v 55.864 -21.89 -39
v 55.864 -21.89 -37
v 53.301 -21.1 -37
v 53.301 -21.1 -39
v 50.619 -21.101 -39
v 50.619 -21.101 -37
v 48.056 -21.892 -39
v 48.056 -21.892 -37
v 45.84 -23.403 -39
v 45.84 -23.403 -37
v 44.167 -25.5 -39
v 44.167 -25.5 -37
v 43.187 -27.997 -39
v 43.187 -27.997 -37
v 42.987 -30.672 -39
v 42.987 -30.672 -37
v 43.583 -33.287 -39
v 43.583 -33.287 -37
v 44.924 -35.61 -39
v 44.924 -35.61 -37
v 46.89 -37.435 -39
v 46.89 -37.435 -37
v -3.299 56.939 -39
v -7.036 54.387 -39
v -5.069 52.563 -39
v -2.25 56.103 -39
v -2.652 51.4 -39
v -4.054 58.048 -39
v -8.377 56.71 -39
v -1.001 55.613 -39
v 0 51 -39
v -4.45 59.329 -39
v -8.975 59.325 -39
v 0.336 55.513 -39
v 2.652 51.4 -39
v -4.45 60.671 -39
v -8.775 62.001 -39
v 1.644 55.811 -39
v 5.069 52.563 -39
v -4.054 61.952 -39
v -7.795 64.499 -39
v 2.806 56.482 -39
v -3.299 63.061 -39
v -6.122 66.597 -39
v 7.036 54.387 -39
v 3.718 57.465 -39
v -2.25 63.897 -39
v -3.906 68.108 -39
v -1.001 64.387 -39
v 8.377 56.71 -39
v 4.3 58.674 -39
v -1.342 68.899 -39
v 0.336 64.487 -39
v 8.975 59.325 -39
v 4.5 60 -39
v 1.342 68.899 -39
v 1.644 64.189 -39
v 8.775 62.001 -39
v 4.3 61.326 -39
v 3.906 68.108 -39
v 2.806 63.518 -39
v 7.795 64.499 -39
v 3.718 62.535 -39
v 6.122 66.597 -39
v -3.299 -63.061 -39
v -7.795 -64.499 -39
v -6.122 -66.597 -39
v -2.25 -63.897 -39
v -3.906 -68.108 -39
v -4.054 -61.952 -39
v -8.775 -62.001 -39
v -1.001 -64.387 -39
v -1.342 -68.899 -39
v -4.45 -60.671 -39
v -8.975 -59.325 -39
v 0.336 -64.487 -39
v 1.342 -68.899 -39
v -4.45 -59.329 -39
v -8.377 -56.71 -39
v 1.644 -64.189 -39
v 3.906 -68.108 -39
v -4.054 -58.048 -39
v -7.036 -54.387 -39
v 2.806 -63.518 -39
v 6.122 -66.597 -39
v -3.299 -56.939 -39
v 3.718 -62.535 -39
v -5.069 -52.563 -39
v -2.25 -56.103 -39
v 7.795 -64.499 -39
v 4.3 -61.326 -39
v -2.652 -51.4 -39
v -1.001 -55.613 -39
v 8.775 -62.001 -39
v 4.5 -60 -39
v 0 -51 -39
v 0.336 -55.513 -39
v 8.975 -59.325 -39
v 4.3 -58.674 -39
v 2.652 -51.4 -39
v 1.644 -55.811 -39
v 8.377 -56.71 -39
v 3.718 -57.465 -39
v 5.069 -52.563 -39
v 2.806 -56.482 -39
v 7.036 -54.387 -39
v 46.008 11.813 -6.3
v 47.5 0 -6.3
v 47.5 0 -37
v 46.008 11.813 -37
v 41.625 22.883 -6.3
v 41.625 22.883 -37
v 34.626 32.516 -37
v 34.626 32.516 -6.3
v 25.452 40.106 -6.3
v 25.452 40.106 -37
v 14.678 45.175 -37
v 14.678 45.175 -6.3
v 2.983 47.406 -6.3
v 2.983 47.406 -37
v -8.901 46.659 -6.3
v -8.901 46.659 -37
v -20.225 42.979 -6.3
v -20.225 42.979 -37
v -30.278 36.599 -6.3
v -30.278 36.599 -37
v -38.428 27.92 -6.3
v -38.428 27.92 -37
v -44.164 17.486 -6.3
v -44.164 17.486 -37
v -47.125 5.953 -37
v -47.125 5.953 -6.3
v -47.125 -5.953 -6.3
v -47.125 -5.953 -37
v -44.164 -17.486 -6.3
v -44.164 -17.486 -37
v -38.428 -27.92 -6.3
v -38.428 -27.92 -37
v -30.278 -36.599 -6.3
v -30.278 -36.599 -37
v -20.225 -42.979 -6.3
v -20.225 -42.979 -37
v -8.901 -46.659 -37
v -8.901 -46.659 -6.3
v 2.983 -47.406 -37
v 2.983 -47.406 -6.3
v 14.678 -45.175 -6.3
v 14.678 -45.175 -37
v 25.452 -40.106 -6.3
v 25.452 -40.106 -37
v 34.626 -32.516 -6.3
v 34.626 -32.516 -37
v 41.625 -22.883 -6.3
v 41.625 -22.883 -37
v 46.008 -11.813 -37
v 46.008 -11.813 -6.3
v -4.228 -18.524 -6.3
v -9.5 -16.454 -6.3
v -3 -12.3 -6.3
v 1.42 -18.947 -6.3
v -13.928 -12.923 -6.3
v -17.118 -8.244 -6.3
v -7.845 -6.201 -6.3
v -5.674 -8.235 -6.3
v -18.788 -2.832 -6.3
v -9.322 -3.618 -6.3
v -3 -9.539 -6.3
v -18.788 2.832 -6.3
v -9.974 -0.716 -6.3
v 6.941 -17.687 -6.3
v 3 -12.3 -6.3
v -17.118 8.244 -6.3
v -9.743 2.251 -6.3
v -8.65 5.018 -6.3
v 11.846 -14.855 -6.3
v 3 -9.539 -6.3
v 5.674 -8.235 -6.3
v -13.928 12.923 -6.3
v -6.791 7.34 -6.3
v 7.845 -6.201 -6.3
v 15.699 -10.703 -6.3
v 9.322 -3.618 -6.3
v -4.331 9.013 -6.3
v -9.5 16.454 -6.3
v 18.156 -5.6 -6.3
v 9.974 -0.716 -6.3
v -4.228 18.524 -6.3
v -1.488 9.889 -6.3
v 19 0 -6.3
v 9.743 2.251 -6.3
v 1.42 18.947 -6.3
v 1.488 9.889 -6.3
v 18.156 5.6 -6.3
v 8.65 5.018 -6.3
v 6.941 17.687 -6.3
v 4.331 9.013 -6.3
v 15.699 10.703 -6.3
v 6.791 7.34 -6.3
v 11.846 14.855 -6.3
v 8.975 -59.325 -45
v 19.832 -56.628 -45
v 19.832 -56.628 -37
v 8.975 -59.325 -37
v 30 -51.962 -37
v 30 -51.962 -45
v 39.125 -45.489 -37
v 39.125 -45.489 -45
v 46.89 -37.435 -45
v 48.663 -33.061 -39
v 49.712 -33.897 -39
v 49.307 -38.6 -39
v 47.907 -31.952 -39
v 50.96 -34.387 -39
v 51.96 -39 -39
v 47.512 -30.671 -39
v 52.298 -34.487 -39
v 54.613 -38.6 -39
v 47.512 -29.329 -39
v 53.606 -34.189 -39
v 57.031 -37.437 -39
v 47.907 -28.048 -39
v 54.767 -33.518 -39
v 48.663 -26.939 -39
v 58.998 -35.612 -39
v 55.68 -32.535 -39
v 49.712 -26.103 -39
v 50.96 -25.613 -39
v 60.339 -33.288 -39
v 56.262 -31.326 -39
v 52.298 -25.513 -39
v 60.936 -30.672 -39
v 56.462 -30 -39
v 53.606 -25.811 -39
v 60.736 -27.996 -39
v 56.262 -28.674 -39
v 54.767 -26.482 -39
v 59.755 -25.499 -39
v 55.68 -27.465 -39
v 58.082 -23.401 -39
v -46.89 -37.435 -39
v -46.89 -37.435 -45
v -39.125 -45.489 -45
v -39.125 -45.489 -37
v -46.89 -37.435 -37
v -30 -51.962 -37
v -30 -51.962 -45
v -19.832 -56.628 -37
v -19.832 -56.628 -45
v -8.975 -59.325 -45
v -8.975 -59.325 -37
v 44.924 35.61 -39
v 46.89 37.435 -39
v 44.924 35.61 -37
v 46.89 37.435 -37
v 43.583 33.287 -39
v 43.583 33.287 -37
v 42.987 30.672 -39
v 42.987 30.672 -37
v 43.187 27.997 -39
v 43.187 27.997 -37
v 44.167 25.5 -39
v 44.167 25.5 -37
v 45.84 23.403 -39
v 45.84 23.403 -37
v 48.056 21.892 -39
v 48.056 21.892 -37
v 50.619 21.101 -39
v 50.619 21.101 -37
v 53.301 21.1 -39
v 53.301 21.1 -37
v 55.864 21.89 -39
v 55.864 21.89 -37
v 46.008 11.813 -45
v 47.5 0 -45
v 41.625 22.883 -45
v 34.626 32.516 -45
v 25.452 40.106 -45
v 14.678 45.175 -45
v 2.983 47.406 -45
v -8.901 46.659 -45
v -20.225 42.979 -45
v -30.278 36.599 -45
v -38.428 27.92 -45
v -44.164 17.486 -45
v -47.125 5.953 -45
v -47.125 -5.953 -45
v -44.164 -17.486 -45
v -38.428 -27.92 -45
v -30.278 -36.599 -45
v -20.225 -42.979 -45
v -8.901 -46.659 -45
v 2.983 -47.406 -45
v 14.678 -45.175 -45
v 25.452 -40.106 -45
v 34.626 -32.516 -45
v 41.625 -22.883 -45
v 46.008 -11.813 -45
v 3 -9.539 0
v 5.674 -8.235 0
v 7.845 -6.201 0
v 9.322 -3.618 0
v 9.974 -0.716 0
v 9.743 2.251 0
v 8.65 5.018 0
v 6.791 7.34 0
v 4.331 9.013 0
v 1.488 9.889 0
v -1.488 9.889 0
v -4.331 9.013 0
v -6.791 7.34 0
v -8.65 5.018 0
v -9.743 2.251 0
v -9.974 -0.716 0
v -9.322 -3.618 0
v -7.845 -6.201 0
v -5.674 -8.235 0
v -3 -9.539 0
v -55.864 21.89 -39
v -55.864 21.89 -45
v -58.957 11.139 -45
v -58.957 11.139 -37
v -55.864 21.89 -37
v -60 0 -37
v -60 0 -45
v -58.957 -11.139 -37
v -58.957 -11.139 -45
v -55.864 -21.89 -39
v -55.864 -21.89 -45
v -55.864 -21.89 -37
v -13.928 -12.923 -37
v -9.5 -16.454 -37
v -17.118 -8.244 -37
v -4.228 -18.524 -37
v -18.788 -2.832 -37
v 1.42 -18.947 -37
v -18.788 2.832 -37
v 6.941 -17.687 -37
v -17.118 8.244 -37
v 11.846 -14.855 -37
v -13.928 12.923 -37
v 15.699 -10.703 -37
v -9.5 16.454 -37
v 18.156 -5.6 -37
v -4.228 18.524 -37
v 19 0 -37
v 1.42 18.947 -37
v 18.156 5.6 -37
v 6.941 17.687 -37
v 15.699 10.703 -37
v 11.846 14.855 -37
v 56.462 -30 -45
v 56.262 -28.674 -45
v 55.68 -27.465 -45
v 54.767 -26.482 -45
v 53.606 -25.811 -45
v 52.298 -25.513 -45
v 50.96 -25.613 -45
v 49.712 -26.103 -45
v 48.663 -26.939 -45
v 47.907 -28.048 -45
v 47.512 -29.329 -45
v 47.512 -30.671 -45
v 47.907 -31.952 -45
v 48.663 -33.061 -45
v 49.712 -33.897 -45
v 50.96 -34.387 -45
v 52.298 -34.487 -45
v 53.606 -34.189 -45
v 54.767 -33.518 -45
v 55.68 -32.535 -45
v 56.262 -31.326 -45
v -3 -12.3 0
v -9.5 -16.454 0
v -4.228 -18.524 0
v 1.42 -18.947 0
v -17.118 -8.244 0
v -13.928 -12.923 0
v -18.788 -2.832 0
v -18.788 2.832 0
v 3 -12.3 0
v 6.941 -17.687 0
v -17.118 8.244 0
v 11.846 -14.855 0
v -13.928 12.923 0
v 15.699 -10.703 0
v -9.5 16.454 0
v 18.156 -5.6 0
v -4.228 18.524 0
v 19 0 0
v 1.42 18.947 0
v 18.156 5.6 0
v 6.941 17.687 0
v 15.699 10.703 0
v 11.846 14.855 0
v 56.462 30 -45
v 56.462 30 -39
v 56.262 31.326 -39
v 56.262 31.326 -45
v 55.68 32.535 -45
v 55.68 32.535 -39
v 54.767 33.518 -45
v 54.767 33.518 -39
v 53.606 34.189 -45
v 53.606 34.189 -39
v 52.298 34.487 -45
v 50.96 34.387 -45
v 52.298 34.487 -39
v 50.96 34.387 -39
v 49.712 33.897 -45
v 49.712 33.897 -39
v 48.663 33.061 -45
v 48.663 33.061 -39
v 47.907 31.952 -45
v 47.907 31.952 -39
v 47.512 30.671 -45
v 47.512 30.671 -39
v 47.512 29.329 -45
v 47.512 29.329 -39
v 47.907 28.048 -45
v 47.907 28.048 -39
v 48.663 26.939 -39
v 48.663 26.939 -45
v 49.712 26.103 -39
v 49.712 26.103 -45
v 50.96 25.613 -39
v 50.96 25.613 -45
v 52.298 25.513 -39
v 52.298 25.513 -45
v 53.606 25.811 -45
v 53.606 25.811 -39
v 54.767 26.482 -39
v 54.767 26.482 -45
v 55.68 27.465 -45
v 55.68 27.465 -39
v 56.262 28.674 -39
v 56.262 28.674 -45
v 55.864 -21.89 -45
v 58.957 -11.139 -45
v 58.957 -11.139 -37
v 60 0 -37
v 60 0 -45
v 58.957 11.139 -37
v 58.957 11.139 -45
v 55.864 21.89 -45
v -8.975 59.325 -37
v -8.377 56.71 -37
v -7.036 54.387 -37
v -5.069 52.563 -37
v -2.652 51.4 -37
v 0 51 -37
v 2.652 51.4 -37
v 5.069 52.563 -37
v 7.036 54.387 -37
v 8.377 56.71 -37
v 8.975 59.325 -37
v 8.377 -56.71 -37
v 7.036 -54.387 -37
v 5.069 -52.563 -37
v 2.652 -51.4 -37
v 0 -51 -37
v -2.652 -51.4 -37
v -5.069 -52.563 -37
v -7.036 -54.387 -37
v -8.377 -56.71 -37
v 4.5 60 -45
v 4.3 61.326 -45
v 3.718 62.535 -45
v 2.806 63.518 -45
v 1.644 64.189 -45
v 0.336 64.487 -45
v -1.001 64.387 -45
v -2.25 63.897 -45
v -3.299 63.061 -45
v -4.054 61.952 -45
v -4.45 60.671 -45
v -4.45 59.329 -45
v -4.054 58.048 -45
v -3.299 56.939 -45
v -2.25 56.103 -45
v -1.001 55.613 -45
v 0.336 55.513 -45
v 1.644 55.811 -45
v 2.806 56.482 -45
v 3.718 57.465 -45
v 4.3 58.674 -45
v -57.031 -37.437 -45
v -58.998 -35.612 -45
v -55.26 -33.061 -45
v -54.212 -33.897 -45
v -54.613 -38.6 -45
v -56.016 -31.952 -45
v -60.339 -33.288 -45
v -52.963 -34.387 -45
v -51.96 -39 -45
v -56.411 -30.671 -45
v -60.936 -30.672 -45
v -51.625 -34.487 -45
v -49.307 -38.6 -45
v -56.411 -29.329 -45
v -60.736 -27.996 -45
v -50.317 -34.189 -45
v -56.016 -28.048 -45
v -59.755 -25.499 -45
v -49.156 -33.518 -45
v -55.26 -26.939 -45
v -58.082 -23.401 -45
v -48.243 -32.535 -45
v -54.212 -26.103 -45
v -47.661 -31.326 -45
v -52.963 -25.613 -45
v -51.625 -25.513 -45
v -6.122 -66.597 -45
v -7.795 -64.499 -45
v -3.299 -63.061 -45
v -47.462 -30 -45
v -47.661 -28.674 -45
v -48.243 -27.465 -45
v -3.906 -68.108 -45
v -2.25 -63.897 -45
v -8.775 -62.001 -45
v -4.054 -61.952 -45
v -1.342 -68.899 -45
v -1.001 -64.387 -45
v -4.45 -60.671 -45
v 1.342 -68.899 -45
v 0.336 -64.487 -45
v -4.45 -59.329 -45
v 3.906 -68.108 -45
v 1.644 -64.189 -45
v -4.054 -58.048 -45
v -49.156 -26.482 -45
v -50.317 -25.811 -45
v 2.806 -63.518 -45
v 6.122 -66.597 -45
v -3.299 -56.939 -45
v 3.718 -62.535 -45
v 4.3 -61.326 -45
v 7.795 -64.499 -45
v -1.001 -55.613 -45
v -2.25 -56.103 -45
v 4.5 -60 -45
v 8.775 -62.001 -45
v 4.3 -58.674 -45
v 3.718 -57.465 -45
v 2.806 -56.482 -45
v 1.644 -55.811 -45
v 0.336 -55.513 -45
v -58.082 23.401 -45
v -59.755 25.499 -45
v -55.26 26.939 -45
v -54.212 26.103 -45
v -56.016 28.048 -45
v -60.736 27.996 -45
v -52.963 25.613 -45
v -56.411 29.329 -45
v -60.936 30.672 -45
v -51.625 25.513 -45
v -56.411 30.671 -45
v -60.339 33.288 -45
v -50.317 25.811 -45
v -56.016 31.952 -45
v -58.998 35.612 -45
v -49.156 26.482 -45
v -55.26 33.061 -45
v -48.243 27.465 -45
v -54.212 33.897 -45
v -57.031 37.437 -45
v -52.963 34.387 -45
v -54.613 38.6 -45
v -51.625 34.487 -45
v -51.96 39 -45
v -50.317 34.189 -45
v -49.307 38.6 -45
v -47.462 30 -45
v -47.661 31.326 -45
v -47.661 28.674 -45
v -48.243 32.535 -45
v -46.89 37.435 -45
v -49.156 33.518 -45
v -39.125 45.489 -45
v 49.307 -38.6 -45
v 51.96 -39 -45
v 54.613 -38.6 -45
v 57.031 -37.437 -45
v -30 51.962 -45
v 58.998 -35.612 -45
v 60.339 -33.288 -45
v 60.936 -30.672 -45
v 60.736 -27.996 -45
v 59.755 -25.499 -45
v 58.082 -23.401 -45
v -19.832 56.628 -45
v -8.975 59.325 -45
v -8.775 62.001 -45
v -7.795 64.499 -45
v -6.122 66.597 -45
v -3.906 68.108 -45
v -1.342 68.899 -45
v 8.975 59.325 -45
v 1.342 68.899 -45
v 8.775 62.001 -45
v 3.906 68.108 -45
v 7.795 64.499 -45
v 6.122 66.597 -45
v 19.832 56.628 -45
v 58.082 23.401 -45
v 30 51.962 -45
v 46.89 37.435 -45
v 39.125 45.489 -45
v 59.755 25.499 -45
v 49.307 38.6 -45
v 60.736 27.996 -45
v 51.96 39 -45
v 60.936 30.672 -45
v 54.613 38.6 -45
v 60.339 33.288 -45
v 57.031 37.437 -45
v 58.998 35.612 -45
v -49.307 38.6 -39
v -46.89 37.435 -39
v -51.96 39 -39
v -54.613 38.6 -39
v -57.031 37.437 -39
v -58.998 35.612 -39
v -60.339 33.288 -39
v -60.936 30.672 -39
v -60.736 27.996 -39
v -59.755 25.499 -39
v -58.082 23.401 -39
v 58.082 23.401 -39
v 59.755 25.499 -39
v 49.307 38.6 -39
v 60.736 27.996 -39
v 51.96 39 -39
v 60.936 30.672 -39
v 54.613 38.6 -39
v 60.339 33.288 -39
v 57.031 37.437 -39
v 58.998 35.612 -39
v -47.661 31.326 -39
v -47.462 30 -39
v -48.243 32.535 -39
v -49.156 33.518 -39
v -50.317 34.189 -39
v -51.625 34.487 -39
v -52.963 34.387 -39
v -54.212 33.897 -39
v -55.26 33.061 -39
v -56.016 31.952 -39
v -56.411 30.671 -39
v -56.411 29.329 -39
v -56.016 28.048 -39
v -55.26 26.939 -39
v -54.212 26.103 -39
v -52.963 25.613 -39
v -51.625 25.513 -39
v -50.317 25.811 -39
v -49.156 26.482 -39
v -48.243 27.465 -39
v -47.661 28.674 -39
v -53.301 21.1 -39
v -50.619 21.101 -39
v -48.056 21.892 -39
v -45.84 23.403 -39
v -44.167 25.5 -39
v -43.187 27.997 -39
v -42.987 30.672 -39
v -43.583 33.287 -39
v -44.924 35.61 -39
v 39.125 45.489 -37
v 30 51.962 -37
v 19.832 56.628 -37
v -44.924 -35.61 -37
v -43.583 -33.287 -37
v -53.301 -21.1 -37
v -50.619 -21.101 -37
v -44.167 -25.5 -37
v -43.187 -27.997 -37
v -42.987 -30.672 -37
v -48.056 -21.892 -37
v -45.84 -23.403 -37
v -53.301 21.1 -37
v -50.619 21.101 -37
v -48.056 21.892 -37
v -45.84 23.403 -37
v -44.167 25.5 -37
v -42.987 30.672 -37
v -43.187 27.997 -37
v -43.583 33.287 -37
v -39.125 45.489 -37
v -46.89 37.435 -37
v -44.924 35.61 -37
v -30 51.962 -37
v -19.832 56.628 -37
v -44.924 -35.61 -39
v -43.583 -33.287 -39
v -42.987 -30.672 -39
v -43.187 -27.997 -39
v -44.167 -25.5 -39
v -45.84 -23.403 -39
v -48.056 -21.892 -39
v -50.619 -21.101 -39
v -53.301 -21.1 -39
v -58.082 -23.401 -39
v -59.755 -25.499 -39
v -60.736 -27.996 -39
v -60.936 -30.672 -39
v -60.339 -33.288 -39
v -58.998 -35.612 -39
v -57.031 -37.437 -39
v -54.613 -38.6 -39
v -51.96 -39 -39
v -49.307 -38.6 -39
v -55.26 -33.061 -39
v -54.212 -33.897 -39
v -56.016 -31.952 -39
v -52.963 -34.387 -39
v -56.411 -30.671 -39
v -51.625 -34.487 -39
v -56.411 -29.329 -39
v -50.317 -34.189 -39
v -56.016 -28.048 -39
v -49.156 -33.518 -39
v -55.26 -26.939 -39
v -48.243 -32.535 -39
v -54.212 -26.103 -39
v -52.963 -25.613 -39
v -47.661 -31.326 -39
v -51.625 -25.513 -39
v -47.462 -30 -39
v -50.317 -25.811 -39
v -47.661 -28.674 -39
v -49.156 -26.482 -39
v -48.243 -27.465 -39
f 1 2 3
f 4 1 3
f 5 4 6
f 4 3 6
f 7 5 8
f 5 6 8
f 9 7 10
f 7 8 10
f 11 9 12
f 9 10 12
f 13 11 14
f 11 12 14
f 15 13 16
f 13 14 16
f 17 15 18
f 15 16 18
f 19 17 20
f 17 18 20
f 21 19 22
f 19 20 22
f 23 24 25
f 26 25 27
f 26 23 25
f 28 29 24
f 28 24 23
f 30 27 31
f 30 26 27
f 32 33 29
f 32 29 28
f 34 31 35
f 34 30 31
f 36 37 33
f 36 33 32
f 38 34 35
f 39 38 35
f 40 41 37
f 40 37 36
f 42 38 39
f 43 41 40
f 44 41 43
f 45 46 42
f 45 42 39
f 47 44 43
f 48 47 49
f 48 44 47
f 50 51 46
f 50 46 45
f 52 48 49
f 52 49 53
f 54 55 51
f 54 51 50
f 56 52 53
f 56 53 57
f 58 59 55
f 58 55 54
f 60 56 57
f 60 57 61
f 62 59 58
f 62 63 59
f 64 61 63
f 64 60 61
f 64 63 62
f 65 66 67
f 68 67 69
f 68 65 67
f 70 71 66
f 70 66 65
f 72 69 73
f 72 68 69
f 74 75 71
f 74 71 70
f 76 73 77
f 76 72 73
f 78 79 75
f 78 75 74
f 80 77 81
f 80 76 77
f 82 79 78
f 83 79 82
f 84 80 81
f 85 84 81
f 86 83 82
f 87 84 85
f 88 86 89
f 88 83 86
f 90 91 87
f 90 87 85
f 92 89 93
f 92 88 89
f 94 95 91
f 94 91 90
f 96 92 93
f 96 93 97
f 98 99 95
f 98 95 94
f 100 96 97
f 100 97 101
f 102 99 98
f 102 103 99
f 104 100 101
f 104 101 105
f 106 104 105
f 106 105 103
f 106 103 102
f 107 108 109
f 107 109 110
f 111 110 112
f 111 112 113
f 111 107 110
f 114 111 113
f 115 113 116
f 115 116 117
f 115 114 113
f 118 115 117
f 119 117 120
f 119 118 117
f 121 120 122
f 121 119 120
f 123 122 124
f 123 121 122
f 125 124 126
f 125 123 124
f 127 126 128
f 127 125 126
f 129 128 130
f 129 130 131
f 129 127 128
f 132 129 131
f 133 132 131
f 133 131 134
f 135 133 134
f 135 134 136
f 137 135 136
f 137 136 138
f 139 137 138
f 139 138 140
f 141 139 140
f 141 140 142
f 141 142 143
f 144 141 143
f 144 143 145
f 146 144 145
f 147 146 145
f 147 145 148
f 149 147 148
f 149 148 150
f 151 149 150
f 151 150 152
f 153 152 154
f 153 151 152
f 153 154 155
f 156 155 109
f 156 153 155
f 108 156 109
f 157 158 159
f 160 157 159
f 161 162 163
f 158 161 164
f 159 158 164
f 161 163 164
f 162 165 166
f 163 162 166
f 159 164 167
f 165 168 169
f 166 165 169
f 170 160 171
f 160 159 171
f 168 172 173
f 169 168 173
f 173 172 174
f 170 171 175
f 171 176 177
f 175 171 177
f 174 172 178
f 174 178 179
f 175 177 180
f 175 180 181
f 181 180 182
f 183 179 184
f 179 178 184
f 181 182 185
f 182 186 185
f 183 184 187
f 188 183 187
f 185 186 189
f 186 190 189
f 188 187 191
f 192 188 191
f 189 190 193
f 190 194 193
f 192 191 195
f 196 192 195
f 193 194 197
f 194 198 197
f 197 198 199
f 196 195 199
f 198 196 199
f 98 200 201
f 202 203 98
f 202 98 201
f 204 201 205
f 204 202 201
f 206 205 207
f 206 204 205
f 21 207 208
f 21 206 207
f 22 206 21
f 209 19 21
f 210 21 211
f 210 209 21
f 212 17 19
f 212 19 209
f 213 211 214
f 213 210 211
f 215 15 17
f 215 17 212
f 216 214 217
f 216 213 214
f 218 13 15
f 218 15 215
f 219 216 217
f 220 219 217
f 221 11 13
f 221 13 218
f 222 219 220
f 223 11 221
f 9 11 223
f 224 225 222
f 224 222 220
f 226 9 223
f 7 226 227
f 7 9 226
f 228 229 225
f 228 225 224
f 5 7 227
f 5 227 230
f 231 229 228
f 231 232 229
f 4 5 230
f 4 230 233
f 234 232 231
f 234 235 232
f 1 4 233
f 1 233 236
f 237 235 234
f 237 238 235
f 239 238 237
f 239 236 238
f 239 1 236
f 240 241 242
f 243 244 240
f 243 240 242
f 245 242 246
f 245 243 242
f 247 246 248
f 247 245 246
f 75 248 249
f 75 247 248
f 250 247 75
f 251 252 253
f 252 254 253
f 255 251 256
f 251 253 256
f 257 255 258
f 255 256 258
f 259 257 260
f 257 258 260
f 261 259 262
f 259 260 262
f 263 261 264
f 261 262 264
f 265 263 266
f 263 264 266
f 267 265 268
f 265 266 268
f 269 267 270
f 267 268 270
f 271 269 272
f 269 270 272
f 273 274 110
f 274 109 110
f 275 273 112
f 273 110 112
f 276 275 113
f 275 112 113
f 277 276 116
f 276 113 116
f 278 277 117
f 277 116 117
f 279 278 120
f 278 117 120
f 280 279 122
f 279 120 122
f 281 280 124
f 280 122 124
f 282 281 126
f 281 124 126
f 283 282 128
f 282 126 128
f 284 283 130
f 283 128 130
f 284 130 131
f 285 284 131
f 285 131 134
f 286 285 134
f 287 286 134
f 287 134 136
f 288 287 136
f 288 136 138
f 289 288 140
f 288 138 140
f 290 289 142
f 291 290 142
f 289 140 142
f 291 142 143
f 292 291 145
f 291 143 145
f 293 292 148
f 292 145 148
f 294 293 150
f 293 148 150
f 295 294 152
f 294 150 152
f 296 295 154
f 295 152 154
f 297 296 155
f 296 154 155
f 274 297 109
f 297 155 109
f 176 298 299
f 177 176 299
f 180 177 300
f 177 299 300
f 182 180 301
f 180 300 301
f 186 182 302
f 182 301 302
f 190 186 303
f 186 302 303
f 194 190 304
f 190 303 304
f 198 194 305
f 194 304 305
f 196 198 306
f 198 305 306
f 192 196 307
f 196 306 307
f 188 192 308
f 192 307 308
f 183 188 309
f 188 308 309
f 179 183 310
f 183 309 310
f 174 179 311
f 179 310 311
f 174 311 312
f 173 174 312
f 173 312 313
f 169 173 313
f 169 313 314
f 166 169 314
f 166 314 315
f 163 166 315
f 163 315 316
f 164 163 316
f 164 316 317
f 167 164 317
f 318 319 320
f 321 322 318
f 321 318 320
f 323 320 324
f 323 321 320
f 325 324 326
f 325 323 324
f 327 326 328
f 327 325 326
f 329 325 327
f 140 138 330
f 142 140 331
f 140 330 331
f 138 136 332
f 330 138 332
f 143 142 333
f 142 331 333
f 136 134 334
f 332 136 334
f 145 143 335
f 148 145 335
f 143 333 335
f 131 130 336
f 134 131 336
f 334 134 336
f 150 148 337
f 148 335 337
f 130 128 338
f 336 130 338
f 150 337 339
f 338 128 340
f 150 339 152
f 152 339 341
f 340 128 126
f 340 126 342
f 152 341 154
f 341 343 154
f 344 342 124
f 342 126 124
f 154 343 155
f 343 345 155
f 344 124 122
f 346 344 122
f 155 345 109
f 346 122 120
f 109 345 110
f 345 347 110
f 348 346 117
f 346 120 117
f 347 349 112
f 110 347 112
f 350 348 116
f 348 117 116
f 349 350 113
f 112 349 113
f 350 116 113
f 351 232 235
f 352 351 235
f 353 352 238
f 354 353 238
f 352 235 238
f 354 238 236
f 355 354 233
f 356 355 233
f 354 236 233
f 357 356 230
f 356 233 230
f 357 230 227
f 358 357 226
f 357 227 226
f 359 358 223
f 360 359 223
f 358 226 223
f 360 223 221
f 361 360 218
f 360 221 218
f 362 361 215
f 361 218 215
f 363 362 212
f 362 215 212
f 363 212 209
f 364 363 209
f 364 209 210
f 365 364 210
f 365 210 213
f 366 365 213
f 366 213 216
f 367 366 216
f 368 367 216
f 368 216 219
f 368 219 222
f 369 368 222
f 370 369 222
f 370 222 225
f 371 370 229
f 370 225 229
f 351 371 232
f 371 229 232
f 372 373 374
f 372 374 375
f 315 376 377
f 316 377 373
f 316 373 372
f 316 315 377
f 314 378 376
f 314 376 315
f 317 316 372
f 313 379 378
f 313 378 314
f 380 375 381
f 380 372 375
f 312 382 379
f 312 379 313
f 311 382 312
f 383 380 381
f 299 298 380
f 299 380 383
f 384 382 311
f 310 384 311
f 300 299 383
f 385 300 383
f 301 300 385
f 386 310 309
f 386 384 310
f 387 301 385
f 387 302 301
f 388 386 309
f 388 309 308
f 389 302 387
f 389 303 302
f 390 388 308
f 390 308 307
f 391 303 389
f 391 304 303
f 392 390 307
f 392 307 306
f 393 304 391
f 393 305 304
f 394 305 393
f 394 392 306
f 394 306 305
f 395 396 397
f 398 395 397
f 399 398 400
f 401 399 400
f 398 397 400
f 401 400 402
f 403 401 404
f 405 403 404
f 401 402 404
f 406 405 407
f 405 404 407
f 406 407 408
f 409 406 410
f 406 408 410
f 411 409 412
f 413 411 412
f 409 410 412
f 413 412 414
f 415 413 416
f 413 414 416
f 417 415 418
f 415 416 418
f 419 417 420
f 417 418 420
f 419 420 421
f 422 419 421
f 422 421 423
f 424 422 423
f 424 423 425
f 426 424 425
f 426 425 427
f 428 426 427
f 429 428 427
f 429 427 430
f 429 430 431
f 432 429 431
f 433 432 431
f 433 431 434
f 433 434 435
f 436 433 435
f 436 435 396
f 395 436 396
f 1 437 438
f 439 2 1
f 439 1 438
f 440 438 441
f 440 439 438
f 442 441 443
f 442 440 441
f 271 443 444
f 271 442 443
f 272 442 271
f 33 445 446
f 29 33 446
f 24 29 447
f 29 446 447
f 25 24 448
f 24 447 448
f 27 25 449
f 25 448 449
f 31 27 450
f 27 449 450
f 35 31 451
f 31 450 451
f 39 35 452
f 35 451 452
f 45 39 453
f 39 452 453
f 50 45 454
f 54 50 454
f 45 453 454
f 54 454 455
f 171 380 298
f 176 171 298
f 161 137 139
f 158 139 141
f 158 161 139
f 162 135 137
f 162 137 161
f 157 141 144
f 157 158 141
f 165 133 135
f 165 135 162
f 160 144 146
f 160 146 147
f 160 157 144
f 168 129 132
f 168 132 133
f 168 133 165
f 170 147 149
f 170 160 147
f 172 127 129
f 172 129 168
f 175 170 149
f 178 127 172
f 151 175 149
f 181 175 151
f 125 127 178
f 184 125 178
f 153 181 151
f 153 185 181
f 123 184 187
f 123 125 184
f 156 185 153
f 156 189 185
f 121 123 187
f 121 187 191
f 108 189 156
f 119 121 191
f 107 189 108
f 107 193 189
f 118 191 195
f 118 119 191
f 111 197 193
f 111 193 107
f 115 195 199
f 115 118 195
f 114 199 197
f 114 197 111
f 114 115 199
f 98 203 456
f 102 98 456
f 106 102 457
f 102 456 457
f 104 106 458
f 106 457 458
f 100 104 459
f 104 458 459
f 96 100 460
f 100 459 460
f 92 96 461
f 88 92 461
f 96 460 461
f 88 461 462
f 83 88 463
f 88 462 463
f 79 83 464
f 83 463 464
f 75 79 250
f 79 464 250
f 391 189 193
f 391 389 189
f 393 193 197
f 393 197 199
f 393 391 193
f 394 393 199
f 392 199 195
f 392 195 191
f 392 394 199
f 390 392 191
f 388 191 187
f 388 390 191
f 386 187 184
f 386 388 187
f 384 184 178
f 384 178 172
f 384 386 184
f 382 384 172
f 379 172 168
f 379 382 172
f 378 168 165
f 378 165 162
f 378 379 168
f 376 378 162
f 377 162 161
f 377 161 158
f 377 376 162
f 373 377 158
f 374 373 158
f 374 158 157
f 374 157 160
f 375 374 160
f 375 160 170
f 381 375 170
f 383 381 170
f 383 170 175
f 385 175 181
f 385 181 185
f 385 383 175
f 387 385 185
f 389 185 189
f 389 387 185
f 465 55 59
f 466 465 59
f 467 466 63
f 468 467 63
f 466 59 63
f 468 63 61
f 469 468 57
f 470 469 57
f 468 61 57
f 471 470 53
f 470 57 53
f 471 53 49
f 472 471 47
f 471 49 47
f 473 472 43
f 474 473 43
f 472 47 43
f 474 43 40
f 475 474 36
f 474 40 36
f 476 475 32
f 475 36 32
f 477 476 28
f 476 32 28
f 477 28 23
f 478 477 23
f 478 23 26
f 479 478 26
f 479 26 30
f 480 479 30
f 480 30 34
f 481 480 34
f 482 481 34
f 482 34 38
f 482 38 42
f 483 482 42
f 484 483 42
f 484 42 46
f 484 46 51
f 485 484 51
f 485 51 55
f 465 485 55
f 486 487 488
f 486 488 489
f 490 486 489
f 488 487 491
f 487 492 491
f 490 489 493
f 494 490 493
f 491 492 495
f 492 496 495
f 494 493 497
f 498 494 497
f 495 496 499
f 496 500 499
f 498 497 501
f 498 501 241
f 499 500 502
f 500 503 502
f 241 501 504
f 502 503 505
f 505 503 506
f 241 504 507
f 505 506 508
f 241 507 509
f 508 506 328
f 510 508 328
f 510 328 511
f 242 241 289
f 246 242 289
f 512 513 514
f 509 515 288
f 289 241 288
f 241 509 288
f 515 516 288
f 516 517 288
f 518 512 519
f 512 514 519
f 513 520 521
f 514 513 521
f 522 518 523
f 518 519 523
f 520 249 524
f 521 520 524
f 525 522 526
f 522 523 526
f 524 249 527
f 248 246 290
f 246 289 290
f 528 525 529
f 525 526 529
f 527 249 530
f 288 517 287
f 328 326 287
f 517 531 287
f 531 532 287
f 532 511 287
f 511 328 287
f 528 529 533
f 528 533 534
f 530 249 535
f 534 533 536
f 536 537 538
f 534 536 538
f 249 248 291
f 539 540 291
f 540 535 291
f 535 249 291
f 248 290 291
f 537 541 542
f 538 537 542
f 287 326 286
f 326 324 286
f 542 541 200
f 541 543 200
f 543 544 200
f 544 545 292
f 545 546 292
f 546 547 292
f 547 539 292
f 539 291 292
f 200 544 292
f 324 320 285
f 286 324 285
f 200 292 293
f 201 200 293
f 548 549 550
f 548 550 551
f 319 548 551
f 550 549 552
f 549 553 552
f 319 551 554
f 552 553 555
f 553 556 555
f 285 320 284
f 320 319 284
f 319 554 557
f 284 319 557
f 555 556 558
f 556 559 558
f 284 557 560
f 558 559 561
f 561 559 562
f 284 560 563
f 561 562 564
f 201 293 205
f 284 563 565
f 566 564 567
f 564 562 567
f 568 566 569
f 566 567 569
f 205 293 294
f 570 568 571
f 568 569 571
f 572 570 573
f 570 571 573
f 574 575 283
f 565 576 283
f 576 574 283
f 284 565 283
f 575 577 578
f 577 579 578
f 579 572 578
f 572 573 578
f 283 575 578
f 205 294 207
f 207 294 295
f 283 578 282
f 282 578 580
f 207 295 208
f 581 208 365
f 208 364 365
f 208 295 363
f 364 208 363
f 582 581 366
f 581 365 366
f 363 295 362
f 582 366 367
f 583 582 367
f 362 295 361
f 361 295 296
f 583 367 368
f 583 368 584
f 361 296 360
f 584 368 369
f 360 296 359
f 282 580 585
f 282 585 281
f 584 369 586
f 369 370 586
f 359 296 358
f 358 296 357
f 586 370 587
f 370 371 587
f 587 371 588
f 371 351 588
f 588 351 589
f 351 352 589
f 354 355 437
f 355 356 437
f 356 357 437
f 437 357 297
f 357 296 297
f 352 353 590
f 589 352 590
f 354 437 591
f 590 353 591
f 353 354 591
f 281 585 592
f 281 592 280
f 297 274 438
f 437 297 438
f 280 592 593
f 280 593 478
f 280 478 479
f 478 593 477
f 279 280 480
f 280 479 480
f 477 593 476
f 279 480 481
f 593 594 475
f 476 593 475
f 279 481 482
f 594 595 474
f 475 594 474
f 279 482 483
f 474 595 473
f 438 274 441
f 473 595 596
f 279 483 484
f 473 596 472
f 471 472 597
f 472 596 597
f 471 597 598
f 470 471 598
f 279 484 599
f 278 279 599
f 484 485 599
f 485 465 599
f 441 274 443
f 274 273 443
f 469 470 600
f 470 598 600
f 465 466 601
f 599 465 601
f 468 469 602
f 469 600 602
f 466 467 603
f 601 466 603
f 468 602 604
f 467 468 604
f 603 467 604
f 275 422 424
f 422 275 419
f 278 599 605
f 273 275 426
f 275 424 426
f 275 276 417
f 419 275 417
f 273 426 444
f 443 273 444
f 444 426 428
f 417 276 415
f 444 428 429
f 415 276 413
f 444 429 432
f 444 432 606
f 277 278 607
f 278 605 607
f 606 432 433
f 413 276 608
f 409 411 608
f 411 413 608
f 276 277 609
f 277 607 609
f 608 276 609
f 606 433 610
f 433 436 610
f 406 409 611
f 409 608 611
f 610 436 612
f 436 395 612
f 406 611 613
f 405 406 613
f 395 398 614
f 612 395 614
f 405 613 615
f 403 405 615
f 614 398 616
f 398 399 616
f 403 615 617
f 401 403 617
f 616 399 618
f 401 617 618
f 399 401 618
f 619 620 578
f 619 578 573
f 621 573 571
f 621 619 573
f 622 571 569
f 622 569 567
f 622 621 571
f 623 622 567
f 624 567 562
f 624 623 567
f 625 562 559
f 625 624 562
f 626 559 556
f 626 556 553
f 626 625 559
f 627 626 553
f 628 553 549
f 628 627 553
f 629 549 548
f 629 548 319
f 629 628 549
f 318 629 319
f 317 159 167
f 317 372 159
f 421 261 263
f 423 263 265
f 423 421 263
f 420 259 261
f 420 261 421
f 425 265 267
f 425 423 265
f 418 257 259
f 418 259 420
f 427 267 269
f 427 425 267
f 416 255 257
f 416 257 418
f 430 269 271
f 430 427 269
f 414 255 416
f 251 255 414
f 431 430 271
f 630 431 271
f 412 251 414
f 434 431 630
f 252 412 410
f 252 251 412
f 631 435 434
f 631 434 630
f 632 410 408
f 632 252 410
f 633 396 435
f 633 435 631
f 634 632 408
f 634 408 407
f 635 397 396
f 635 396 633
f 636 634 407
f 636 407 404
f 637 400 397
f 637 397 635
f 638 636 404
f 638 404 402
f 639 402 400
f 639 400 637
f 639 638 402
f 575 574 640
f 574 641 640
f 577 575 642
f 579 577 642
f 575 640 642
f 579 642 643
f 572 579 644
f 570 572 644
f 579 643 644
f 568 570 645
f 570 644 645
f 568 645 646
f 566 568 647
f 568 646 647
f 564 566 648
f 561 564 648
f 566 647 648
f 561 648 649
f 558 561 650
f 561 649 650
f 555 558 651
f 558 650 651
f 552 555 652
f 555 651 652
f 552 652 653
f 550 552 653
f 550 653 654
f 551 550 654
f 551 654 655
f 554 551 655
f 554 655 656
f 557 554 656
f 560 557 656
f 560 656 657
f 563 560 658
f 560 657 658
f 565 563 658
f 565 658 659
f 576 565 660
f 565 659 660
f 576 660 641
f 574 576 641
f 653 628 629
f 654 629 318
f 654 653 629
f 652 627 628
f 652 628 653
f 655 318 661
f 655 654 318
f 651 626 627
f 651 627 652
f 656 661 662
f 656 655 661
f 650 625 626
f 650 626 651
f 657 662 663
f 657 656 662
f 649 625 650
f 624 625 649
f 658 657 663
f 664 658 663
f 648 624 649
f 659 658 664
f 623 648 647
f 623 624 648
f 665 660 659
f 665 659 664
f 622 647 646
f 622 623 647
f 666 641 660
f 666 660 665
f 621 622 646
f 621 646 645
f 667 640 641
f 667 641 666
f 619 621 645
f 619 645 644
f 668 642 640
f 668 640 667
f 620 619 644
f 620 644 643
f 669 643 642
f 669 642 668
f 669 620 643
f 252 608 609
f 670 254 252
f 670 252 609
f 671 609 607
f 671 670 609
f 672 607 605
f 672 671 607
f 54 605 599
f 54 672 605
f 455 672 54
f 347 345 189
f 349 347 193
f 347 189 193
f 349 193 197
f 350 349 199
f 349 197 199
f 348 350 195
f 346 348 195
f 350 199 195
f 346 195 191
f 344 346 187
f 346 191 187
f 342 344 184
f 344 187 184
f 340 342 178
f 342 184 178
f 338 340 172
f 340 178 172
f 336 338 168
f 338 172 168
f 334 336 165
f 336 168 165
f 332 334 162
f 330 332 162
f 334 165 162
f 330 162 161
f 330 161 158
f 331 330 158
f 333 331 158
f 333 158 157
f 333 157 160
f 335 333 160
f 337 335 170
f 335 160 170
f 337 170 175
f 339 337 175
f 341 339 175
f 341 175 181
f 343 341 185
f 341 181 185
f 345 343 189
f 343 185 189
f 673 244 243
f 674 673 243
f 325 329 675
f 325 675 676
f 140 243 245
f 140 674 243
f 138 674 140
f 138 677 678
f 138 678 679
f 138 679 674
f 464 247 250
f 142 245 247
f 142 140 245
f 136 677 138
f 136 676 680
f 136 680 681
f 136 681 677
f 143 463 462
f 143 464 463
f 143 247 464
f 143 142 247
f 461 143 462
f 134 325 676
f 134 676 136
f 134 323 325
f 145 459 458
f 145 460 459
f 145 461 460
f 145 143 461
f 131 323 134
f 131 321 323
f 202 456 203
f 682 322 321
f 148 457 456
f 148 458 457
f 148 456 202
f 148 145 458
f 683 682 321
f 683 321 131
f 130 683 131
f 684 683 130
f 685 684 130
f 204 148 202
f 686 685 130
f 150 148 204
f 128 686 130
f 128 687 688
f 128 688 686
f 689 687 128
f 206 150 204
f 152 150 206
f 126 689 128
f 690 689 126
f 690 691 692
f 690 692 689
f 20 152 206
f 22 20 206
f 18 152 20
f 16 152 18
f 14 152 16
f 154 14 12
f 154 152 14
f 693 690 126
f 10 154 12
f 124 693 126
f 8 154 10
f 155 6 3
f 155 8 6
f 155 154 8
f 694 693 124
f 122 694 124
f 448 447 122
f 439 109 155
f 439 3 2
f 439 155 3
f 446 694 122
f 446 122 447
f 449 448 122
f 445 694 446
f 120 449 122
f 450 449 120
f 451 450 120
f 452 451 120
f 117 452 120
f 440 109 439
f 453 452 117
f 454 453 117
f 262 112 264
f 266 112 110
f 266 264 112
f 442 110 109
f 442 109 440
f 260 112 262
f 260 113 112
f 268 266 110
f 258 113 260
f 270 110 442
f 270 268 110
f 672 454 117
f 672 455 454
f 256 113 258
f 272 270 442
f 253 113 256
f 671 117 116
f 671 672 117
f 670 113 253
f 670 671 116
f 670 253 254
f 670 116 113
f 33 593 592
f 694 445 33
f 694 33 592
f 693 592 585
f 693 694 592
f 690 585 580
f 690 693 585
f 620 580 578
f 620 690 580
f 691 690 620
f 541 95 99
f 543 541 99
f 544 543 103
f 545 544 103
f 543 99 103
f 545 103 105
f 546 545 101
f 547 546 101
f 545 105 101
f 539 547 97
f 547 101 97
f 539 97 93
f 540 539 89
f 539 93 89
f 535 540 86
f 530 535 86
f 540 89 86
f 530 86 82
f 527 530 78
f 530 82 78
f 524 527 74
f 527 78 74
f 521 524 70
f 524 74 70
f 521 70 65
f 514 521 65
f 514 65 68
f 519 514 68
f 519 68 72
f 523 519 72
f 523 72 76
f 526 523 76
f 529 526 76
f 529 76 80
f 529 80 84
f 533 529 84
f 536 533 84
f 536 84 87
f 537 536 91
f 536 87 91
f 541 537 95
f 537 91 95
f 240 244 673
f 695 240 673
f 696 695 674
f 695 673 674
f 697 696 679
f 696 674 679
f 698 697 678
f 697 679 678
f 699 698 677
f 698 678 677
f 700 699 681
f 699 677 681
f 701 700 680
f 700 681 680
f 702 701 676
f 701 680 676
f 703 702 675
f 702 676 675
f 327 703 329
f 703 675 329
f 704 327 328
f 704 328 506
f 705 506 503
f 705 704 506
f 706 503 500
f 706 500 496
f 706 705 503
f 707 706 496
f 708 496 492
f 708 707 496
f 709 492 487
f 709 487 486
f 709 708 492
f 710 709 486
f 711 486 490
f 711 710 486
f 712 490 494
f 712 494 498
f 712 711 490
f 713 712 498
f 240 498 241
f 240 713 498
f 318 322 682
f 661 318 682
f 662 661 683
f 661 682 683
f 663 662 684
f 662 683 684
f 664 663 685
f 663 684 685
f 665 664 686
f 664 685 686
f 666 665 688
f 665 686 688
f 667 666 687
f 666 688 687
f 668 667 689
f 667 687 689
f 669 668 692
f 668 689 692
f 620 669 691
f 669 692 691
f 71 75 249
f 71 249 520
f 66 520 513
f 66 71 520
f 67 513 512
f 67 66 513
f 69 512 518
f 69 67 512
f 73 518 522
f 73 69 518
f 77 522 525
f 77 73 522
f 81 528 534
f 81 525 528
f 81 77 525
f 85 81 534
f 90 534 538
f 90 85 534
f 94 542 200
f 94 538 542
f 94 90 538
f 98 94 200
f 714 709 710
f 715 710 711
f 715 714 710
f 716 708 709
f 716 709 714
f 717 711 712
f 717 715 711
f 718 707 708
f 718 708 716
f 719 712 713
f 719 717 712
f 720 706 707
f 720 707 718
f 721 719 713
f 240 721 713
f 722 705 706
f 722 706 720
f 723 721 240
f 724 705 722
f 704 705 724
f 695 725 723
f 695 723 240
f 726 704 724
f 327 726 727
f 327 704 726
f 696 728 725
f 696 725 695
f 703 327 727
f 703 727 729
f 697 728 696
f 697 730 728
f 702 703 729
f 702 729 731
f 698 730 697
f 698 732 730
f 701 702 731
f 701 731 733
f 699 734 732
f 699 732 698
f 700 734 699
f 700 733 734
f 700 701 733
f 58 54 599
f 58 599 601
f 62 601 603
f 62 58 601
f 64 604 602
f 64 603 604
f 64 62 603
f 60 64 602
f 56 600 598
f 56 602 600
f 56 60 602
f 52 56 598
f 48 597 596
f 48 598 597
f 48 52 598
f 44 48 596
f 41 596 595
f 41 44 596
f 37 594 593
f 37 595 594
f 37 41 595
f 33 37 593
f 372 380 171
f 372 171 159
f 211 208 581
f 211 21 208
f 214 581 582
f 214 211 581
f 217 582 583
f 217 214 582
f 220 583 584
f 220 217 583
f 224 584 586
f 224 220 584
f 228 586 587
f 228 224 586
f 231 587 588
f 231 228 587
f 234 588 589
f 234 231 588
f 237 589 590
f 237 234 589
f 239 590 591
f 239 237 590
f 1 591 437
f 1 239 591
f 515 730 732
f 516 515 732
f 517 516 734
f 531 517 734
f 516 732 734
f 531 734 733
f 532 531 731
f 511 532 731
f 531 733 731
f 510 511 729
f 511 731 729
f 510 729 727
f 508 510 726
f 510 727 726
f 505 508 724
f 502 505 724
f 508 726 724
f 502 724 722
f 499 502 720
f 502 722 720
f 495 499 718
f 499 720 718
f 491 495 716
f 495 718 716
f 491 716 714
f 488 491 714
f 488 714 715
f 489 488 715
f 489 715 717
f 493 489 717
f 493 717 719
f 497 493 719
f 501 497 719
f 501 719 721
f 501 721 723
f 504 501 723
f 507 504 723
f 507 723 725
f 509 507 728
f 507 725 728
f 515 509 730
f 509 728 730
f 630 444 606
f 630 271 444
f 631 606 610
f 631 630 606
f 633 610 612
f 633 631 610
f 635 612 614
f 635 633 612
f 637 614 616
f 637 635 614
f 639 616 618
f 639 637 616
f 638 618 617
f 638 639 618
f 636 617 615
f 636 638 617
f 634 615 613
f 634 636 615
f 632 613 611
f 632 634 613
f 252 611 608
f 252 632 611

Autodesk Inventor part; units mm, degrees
ref_plane "YZ Plane" through (0, 0, 0) normal (1, 0, 0) x (0, 1, 0)
ref_plane "XZ Plane" through (0, 0, 0) normal (0, 1, 0) x (-1, 0, 0)
ref_plane "XY Plane" through (0, 0, 0) normal (0, 0, 1) x (1, 0, 0)
sketch "Sketch1" plane through (0, 0, 0) normal (0, 0, 1) x (1, 0, 0)
  circle A0 centre (0, 0) radius 19
  circle A1 centre (0, 0) radius 10
  line L0 (0, -10) -> (0, -12.3)
  line L1 (0, -12.3) -> (-3, -12.3)
  line L2 (0, -12.3) -> (3, -12.3)
  line L3 (3, -12.3) -> (3, -9.5394)
  line L4 (-3, -12.3) -> (-3, -9.5394)
  circle A2 centre (0, 0) radius 66
  circle A3 centre (0, 0) radius 60
  circle A4 centre (0, 0) radius 47.5
  circle A5 centre (0, 60) radius 4.5
  circle A6 centre (-51.9615, 30) radius 4.5
  circle A7 centre (-51.9615, -30) radius 4.5
  circle A8 centre (0, -60) radius 4.5
  circle A9 centre (51.9615, -30) radius 4.5
  circle A10 centre (51.9615, 30) radius 4.5
  circle A11 centre (0, 60) radius 9
  circle A12 centre (-51.9615, 30) radius 9
  circle A13 centre (-51.9615, -30) radius 9
  circle A14 centre (0, -60) radius 9
  circle A15 centre (51.9615, -30) radius 9
  circle A16 centre (51.9615, 30) radius 9
  point P0 (-7.0256, 65.625)
  point P1 (-53.3201, 38.8969)
  point P2 (-60.3457, 26.7281)
  point P3 (-7.0256, -65.625)
  point P4 (7.0256, -65.625)
  point P5 (53.3201, -38.8969)
  point P6 (60.3457, -26.7281)
  point P7 (7.0256, 65.625)
  point P8 (55.8643, 21.8902)
  point P9 (46.8896, 37.4348)
  point P10 (8.9747, 59.325)
  point P11 (-8.9747, 59.325)
  point P12 (-46.8896, 37.4348)
  point P13 (-55.8643, 21.8902)
  point P14 (-55.8643, -21.8902)
  point P15 (-46.8896, -37.4348)
  point P16 (-8.9747, -59.325)
  point P17 (8.9747, -59.325)
  point P18 (46.8896, -37.4348)
  point P19 (55.8643, -21.8902)
  dimension "d6" = 120
  dimension "d0" = 38
  dimension "d1" = 20
  dimension "d2" = 2.3
  dimension "d3" = 3
  dimension "d4" = 3
  dimension "d5" = 132
  dimension "d7" = 95
  dimension "d8" = 9
  dimension "d11" = 360
  dimension "d13" = 18
  dimension "d16" = 360
sketch "Sketch2" plane through (0, 0, 0) normal (1, 0, 0) x (0, 1, 0)
  line L0 (0, 0) -> (0, -45)
  line L1 (0, 0) -> (0, -38)
  line L2 (0, -45) -> (0, -37)
  line L3 (0, 0) -> (10, 0)
  line L4 (10, 0) -> (10, -38)
  line L5 (10, -38) -> (19, -38)
  line L6 (19, 0) -> (19, -38)
  line L7 (0, 0) -> (0, -6.3)
  line L8 (0, -6.3) -> (19, -6.3)
  dimension "d18" = 45
  dimension "d19" = 38
  dimension "d20" = 8
  dimension "d21" = 10
  dimension "d22" = 38
  dimension "d23" = 9
  dimension "d34" = 6.3
extrude "Extrusion3" add sketch "Sketch1" against normal blind 6.3 contours A0
extrude "Extrusion4" add sketch "Sketch1" against normal blind 37 contours A4
extrude "Extrusion5" cut sketch "Sketch1" against normal blind 6.3 contours A4
extrude "Extrusion6" add sketch "Sketch1" against normal blind 45 contours A3 A15 A14 A13 A12 A11 A16
extrude "Extrusion8" cut sketch "Sketch1" against normal blind 37 contours A3 A15 A14 A13 A12 A11 A16
extrude "Extrusion9" add sketch "Sketch1" against normal blind 45 contours A16 A3 A10 A2 | A2 A16 | A15 A2 | A2 A15 A3 A9 | A16 A3 A10 | A3 A9 A15 | A11 A3 A5 A2 | A2 A11 | A10 A3 | A3 A10 | A14 A2 | A2 A14 A3 A8 | A9 A3 | A3 A9 | A11 A3 A5 | A3 A8 A14 | A12 A3 A6 A2 | A2 A12 | A5 A3 | A3 A5 | A13 A2 | A2 A13 A3 A7 | A8 A3 | A3 A8 | A12 A3 A6 | A3 A7 A13 | A6 A3 | A3 A6 | A7 A3 | A3 A7
extrude "Extrusion10" cut sketch "Sketch1" against normal blind 39 contours A16 A3 A10 A2 | A2 A16 | A15 A2 | A2 A15 A3 A9 | A16 A3 A10 | A3 A9 A15 | A11 A3 A5 A2 | A2 A11 | A10 A3 | A3 A10 | A14 A2 | A2 A14 A3 A8 | A9 A3 | A3 A9 | A11 A3 A5 | A3 A8 A14 | A12 A3 A6 A2 | A2 A12 | A5 A3 | A3 A5 | A13 A2 | A2 A13 A3 A7 | A8 A3 | A3 A8 | A12 A3 A6 | A3 A7 A13 | A6 A3 | A3 A6 | A7 A3 | A3 A7
extrude "Extrusion11" cut sketch "Sketch1" against normal blind 45 contours A10 A3 | A3 A10 | A9 A3 | A3 A9 | A5 A3 | A3 A5 | A8 A3 | A3 A8 | A6 A3 | A3 A6 | A7 A3 | A3 A7
properties part number "Bai13"
